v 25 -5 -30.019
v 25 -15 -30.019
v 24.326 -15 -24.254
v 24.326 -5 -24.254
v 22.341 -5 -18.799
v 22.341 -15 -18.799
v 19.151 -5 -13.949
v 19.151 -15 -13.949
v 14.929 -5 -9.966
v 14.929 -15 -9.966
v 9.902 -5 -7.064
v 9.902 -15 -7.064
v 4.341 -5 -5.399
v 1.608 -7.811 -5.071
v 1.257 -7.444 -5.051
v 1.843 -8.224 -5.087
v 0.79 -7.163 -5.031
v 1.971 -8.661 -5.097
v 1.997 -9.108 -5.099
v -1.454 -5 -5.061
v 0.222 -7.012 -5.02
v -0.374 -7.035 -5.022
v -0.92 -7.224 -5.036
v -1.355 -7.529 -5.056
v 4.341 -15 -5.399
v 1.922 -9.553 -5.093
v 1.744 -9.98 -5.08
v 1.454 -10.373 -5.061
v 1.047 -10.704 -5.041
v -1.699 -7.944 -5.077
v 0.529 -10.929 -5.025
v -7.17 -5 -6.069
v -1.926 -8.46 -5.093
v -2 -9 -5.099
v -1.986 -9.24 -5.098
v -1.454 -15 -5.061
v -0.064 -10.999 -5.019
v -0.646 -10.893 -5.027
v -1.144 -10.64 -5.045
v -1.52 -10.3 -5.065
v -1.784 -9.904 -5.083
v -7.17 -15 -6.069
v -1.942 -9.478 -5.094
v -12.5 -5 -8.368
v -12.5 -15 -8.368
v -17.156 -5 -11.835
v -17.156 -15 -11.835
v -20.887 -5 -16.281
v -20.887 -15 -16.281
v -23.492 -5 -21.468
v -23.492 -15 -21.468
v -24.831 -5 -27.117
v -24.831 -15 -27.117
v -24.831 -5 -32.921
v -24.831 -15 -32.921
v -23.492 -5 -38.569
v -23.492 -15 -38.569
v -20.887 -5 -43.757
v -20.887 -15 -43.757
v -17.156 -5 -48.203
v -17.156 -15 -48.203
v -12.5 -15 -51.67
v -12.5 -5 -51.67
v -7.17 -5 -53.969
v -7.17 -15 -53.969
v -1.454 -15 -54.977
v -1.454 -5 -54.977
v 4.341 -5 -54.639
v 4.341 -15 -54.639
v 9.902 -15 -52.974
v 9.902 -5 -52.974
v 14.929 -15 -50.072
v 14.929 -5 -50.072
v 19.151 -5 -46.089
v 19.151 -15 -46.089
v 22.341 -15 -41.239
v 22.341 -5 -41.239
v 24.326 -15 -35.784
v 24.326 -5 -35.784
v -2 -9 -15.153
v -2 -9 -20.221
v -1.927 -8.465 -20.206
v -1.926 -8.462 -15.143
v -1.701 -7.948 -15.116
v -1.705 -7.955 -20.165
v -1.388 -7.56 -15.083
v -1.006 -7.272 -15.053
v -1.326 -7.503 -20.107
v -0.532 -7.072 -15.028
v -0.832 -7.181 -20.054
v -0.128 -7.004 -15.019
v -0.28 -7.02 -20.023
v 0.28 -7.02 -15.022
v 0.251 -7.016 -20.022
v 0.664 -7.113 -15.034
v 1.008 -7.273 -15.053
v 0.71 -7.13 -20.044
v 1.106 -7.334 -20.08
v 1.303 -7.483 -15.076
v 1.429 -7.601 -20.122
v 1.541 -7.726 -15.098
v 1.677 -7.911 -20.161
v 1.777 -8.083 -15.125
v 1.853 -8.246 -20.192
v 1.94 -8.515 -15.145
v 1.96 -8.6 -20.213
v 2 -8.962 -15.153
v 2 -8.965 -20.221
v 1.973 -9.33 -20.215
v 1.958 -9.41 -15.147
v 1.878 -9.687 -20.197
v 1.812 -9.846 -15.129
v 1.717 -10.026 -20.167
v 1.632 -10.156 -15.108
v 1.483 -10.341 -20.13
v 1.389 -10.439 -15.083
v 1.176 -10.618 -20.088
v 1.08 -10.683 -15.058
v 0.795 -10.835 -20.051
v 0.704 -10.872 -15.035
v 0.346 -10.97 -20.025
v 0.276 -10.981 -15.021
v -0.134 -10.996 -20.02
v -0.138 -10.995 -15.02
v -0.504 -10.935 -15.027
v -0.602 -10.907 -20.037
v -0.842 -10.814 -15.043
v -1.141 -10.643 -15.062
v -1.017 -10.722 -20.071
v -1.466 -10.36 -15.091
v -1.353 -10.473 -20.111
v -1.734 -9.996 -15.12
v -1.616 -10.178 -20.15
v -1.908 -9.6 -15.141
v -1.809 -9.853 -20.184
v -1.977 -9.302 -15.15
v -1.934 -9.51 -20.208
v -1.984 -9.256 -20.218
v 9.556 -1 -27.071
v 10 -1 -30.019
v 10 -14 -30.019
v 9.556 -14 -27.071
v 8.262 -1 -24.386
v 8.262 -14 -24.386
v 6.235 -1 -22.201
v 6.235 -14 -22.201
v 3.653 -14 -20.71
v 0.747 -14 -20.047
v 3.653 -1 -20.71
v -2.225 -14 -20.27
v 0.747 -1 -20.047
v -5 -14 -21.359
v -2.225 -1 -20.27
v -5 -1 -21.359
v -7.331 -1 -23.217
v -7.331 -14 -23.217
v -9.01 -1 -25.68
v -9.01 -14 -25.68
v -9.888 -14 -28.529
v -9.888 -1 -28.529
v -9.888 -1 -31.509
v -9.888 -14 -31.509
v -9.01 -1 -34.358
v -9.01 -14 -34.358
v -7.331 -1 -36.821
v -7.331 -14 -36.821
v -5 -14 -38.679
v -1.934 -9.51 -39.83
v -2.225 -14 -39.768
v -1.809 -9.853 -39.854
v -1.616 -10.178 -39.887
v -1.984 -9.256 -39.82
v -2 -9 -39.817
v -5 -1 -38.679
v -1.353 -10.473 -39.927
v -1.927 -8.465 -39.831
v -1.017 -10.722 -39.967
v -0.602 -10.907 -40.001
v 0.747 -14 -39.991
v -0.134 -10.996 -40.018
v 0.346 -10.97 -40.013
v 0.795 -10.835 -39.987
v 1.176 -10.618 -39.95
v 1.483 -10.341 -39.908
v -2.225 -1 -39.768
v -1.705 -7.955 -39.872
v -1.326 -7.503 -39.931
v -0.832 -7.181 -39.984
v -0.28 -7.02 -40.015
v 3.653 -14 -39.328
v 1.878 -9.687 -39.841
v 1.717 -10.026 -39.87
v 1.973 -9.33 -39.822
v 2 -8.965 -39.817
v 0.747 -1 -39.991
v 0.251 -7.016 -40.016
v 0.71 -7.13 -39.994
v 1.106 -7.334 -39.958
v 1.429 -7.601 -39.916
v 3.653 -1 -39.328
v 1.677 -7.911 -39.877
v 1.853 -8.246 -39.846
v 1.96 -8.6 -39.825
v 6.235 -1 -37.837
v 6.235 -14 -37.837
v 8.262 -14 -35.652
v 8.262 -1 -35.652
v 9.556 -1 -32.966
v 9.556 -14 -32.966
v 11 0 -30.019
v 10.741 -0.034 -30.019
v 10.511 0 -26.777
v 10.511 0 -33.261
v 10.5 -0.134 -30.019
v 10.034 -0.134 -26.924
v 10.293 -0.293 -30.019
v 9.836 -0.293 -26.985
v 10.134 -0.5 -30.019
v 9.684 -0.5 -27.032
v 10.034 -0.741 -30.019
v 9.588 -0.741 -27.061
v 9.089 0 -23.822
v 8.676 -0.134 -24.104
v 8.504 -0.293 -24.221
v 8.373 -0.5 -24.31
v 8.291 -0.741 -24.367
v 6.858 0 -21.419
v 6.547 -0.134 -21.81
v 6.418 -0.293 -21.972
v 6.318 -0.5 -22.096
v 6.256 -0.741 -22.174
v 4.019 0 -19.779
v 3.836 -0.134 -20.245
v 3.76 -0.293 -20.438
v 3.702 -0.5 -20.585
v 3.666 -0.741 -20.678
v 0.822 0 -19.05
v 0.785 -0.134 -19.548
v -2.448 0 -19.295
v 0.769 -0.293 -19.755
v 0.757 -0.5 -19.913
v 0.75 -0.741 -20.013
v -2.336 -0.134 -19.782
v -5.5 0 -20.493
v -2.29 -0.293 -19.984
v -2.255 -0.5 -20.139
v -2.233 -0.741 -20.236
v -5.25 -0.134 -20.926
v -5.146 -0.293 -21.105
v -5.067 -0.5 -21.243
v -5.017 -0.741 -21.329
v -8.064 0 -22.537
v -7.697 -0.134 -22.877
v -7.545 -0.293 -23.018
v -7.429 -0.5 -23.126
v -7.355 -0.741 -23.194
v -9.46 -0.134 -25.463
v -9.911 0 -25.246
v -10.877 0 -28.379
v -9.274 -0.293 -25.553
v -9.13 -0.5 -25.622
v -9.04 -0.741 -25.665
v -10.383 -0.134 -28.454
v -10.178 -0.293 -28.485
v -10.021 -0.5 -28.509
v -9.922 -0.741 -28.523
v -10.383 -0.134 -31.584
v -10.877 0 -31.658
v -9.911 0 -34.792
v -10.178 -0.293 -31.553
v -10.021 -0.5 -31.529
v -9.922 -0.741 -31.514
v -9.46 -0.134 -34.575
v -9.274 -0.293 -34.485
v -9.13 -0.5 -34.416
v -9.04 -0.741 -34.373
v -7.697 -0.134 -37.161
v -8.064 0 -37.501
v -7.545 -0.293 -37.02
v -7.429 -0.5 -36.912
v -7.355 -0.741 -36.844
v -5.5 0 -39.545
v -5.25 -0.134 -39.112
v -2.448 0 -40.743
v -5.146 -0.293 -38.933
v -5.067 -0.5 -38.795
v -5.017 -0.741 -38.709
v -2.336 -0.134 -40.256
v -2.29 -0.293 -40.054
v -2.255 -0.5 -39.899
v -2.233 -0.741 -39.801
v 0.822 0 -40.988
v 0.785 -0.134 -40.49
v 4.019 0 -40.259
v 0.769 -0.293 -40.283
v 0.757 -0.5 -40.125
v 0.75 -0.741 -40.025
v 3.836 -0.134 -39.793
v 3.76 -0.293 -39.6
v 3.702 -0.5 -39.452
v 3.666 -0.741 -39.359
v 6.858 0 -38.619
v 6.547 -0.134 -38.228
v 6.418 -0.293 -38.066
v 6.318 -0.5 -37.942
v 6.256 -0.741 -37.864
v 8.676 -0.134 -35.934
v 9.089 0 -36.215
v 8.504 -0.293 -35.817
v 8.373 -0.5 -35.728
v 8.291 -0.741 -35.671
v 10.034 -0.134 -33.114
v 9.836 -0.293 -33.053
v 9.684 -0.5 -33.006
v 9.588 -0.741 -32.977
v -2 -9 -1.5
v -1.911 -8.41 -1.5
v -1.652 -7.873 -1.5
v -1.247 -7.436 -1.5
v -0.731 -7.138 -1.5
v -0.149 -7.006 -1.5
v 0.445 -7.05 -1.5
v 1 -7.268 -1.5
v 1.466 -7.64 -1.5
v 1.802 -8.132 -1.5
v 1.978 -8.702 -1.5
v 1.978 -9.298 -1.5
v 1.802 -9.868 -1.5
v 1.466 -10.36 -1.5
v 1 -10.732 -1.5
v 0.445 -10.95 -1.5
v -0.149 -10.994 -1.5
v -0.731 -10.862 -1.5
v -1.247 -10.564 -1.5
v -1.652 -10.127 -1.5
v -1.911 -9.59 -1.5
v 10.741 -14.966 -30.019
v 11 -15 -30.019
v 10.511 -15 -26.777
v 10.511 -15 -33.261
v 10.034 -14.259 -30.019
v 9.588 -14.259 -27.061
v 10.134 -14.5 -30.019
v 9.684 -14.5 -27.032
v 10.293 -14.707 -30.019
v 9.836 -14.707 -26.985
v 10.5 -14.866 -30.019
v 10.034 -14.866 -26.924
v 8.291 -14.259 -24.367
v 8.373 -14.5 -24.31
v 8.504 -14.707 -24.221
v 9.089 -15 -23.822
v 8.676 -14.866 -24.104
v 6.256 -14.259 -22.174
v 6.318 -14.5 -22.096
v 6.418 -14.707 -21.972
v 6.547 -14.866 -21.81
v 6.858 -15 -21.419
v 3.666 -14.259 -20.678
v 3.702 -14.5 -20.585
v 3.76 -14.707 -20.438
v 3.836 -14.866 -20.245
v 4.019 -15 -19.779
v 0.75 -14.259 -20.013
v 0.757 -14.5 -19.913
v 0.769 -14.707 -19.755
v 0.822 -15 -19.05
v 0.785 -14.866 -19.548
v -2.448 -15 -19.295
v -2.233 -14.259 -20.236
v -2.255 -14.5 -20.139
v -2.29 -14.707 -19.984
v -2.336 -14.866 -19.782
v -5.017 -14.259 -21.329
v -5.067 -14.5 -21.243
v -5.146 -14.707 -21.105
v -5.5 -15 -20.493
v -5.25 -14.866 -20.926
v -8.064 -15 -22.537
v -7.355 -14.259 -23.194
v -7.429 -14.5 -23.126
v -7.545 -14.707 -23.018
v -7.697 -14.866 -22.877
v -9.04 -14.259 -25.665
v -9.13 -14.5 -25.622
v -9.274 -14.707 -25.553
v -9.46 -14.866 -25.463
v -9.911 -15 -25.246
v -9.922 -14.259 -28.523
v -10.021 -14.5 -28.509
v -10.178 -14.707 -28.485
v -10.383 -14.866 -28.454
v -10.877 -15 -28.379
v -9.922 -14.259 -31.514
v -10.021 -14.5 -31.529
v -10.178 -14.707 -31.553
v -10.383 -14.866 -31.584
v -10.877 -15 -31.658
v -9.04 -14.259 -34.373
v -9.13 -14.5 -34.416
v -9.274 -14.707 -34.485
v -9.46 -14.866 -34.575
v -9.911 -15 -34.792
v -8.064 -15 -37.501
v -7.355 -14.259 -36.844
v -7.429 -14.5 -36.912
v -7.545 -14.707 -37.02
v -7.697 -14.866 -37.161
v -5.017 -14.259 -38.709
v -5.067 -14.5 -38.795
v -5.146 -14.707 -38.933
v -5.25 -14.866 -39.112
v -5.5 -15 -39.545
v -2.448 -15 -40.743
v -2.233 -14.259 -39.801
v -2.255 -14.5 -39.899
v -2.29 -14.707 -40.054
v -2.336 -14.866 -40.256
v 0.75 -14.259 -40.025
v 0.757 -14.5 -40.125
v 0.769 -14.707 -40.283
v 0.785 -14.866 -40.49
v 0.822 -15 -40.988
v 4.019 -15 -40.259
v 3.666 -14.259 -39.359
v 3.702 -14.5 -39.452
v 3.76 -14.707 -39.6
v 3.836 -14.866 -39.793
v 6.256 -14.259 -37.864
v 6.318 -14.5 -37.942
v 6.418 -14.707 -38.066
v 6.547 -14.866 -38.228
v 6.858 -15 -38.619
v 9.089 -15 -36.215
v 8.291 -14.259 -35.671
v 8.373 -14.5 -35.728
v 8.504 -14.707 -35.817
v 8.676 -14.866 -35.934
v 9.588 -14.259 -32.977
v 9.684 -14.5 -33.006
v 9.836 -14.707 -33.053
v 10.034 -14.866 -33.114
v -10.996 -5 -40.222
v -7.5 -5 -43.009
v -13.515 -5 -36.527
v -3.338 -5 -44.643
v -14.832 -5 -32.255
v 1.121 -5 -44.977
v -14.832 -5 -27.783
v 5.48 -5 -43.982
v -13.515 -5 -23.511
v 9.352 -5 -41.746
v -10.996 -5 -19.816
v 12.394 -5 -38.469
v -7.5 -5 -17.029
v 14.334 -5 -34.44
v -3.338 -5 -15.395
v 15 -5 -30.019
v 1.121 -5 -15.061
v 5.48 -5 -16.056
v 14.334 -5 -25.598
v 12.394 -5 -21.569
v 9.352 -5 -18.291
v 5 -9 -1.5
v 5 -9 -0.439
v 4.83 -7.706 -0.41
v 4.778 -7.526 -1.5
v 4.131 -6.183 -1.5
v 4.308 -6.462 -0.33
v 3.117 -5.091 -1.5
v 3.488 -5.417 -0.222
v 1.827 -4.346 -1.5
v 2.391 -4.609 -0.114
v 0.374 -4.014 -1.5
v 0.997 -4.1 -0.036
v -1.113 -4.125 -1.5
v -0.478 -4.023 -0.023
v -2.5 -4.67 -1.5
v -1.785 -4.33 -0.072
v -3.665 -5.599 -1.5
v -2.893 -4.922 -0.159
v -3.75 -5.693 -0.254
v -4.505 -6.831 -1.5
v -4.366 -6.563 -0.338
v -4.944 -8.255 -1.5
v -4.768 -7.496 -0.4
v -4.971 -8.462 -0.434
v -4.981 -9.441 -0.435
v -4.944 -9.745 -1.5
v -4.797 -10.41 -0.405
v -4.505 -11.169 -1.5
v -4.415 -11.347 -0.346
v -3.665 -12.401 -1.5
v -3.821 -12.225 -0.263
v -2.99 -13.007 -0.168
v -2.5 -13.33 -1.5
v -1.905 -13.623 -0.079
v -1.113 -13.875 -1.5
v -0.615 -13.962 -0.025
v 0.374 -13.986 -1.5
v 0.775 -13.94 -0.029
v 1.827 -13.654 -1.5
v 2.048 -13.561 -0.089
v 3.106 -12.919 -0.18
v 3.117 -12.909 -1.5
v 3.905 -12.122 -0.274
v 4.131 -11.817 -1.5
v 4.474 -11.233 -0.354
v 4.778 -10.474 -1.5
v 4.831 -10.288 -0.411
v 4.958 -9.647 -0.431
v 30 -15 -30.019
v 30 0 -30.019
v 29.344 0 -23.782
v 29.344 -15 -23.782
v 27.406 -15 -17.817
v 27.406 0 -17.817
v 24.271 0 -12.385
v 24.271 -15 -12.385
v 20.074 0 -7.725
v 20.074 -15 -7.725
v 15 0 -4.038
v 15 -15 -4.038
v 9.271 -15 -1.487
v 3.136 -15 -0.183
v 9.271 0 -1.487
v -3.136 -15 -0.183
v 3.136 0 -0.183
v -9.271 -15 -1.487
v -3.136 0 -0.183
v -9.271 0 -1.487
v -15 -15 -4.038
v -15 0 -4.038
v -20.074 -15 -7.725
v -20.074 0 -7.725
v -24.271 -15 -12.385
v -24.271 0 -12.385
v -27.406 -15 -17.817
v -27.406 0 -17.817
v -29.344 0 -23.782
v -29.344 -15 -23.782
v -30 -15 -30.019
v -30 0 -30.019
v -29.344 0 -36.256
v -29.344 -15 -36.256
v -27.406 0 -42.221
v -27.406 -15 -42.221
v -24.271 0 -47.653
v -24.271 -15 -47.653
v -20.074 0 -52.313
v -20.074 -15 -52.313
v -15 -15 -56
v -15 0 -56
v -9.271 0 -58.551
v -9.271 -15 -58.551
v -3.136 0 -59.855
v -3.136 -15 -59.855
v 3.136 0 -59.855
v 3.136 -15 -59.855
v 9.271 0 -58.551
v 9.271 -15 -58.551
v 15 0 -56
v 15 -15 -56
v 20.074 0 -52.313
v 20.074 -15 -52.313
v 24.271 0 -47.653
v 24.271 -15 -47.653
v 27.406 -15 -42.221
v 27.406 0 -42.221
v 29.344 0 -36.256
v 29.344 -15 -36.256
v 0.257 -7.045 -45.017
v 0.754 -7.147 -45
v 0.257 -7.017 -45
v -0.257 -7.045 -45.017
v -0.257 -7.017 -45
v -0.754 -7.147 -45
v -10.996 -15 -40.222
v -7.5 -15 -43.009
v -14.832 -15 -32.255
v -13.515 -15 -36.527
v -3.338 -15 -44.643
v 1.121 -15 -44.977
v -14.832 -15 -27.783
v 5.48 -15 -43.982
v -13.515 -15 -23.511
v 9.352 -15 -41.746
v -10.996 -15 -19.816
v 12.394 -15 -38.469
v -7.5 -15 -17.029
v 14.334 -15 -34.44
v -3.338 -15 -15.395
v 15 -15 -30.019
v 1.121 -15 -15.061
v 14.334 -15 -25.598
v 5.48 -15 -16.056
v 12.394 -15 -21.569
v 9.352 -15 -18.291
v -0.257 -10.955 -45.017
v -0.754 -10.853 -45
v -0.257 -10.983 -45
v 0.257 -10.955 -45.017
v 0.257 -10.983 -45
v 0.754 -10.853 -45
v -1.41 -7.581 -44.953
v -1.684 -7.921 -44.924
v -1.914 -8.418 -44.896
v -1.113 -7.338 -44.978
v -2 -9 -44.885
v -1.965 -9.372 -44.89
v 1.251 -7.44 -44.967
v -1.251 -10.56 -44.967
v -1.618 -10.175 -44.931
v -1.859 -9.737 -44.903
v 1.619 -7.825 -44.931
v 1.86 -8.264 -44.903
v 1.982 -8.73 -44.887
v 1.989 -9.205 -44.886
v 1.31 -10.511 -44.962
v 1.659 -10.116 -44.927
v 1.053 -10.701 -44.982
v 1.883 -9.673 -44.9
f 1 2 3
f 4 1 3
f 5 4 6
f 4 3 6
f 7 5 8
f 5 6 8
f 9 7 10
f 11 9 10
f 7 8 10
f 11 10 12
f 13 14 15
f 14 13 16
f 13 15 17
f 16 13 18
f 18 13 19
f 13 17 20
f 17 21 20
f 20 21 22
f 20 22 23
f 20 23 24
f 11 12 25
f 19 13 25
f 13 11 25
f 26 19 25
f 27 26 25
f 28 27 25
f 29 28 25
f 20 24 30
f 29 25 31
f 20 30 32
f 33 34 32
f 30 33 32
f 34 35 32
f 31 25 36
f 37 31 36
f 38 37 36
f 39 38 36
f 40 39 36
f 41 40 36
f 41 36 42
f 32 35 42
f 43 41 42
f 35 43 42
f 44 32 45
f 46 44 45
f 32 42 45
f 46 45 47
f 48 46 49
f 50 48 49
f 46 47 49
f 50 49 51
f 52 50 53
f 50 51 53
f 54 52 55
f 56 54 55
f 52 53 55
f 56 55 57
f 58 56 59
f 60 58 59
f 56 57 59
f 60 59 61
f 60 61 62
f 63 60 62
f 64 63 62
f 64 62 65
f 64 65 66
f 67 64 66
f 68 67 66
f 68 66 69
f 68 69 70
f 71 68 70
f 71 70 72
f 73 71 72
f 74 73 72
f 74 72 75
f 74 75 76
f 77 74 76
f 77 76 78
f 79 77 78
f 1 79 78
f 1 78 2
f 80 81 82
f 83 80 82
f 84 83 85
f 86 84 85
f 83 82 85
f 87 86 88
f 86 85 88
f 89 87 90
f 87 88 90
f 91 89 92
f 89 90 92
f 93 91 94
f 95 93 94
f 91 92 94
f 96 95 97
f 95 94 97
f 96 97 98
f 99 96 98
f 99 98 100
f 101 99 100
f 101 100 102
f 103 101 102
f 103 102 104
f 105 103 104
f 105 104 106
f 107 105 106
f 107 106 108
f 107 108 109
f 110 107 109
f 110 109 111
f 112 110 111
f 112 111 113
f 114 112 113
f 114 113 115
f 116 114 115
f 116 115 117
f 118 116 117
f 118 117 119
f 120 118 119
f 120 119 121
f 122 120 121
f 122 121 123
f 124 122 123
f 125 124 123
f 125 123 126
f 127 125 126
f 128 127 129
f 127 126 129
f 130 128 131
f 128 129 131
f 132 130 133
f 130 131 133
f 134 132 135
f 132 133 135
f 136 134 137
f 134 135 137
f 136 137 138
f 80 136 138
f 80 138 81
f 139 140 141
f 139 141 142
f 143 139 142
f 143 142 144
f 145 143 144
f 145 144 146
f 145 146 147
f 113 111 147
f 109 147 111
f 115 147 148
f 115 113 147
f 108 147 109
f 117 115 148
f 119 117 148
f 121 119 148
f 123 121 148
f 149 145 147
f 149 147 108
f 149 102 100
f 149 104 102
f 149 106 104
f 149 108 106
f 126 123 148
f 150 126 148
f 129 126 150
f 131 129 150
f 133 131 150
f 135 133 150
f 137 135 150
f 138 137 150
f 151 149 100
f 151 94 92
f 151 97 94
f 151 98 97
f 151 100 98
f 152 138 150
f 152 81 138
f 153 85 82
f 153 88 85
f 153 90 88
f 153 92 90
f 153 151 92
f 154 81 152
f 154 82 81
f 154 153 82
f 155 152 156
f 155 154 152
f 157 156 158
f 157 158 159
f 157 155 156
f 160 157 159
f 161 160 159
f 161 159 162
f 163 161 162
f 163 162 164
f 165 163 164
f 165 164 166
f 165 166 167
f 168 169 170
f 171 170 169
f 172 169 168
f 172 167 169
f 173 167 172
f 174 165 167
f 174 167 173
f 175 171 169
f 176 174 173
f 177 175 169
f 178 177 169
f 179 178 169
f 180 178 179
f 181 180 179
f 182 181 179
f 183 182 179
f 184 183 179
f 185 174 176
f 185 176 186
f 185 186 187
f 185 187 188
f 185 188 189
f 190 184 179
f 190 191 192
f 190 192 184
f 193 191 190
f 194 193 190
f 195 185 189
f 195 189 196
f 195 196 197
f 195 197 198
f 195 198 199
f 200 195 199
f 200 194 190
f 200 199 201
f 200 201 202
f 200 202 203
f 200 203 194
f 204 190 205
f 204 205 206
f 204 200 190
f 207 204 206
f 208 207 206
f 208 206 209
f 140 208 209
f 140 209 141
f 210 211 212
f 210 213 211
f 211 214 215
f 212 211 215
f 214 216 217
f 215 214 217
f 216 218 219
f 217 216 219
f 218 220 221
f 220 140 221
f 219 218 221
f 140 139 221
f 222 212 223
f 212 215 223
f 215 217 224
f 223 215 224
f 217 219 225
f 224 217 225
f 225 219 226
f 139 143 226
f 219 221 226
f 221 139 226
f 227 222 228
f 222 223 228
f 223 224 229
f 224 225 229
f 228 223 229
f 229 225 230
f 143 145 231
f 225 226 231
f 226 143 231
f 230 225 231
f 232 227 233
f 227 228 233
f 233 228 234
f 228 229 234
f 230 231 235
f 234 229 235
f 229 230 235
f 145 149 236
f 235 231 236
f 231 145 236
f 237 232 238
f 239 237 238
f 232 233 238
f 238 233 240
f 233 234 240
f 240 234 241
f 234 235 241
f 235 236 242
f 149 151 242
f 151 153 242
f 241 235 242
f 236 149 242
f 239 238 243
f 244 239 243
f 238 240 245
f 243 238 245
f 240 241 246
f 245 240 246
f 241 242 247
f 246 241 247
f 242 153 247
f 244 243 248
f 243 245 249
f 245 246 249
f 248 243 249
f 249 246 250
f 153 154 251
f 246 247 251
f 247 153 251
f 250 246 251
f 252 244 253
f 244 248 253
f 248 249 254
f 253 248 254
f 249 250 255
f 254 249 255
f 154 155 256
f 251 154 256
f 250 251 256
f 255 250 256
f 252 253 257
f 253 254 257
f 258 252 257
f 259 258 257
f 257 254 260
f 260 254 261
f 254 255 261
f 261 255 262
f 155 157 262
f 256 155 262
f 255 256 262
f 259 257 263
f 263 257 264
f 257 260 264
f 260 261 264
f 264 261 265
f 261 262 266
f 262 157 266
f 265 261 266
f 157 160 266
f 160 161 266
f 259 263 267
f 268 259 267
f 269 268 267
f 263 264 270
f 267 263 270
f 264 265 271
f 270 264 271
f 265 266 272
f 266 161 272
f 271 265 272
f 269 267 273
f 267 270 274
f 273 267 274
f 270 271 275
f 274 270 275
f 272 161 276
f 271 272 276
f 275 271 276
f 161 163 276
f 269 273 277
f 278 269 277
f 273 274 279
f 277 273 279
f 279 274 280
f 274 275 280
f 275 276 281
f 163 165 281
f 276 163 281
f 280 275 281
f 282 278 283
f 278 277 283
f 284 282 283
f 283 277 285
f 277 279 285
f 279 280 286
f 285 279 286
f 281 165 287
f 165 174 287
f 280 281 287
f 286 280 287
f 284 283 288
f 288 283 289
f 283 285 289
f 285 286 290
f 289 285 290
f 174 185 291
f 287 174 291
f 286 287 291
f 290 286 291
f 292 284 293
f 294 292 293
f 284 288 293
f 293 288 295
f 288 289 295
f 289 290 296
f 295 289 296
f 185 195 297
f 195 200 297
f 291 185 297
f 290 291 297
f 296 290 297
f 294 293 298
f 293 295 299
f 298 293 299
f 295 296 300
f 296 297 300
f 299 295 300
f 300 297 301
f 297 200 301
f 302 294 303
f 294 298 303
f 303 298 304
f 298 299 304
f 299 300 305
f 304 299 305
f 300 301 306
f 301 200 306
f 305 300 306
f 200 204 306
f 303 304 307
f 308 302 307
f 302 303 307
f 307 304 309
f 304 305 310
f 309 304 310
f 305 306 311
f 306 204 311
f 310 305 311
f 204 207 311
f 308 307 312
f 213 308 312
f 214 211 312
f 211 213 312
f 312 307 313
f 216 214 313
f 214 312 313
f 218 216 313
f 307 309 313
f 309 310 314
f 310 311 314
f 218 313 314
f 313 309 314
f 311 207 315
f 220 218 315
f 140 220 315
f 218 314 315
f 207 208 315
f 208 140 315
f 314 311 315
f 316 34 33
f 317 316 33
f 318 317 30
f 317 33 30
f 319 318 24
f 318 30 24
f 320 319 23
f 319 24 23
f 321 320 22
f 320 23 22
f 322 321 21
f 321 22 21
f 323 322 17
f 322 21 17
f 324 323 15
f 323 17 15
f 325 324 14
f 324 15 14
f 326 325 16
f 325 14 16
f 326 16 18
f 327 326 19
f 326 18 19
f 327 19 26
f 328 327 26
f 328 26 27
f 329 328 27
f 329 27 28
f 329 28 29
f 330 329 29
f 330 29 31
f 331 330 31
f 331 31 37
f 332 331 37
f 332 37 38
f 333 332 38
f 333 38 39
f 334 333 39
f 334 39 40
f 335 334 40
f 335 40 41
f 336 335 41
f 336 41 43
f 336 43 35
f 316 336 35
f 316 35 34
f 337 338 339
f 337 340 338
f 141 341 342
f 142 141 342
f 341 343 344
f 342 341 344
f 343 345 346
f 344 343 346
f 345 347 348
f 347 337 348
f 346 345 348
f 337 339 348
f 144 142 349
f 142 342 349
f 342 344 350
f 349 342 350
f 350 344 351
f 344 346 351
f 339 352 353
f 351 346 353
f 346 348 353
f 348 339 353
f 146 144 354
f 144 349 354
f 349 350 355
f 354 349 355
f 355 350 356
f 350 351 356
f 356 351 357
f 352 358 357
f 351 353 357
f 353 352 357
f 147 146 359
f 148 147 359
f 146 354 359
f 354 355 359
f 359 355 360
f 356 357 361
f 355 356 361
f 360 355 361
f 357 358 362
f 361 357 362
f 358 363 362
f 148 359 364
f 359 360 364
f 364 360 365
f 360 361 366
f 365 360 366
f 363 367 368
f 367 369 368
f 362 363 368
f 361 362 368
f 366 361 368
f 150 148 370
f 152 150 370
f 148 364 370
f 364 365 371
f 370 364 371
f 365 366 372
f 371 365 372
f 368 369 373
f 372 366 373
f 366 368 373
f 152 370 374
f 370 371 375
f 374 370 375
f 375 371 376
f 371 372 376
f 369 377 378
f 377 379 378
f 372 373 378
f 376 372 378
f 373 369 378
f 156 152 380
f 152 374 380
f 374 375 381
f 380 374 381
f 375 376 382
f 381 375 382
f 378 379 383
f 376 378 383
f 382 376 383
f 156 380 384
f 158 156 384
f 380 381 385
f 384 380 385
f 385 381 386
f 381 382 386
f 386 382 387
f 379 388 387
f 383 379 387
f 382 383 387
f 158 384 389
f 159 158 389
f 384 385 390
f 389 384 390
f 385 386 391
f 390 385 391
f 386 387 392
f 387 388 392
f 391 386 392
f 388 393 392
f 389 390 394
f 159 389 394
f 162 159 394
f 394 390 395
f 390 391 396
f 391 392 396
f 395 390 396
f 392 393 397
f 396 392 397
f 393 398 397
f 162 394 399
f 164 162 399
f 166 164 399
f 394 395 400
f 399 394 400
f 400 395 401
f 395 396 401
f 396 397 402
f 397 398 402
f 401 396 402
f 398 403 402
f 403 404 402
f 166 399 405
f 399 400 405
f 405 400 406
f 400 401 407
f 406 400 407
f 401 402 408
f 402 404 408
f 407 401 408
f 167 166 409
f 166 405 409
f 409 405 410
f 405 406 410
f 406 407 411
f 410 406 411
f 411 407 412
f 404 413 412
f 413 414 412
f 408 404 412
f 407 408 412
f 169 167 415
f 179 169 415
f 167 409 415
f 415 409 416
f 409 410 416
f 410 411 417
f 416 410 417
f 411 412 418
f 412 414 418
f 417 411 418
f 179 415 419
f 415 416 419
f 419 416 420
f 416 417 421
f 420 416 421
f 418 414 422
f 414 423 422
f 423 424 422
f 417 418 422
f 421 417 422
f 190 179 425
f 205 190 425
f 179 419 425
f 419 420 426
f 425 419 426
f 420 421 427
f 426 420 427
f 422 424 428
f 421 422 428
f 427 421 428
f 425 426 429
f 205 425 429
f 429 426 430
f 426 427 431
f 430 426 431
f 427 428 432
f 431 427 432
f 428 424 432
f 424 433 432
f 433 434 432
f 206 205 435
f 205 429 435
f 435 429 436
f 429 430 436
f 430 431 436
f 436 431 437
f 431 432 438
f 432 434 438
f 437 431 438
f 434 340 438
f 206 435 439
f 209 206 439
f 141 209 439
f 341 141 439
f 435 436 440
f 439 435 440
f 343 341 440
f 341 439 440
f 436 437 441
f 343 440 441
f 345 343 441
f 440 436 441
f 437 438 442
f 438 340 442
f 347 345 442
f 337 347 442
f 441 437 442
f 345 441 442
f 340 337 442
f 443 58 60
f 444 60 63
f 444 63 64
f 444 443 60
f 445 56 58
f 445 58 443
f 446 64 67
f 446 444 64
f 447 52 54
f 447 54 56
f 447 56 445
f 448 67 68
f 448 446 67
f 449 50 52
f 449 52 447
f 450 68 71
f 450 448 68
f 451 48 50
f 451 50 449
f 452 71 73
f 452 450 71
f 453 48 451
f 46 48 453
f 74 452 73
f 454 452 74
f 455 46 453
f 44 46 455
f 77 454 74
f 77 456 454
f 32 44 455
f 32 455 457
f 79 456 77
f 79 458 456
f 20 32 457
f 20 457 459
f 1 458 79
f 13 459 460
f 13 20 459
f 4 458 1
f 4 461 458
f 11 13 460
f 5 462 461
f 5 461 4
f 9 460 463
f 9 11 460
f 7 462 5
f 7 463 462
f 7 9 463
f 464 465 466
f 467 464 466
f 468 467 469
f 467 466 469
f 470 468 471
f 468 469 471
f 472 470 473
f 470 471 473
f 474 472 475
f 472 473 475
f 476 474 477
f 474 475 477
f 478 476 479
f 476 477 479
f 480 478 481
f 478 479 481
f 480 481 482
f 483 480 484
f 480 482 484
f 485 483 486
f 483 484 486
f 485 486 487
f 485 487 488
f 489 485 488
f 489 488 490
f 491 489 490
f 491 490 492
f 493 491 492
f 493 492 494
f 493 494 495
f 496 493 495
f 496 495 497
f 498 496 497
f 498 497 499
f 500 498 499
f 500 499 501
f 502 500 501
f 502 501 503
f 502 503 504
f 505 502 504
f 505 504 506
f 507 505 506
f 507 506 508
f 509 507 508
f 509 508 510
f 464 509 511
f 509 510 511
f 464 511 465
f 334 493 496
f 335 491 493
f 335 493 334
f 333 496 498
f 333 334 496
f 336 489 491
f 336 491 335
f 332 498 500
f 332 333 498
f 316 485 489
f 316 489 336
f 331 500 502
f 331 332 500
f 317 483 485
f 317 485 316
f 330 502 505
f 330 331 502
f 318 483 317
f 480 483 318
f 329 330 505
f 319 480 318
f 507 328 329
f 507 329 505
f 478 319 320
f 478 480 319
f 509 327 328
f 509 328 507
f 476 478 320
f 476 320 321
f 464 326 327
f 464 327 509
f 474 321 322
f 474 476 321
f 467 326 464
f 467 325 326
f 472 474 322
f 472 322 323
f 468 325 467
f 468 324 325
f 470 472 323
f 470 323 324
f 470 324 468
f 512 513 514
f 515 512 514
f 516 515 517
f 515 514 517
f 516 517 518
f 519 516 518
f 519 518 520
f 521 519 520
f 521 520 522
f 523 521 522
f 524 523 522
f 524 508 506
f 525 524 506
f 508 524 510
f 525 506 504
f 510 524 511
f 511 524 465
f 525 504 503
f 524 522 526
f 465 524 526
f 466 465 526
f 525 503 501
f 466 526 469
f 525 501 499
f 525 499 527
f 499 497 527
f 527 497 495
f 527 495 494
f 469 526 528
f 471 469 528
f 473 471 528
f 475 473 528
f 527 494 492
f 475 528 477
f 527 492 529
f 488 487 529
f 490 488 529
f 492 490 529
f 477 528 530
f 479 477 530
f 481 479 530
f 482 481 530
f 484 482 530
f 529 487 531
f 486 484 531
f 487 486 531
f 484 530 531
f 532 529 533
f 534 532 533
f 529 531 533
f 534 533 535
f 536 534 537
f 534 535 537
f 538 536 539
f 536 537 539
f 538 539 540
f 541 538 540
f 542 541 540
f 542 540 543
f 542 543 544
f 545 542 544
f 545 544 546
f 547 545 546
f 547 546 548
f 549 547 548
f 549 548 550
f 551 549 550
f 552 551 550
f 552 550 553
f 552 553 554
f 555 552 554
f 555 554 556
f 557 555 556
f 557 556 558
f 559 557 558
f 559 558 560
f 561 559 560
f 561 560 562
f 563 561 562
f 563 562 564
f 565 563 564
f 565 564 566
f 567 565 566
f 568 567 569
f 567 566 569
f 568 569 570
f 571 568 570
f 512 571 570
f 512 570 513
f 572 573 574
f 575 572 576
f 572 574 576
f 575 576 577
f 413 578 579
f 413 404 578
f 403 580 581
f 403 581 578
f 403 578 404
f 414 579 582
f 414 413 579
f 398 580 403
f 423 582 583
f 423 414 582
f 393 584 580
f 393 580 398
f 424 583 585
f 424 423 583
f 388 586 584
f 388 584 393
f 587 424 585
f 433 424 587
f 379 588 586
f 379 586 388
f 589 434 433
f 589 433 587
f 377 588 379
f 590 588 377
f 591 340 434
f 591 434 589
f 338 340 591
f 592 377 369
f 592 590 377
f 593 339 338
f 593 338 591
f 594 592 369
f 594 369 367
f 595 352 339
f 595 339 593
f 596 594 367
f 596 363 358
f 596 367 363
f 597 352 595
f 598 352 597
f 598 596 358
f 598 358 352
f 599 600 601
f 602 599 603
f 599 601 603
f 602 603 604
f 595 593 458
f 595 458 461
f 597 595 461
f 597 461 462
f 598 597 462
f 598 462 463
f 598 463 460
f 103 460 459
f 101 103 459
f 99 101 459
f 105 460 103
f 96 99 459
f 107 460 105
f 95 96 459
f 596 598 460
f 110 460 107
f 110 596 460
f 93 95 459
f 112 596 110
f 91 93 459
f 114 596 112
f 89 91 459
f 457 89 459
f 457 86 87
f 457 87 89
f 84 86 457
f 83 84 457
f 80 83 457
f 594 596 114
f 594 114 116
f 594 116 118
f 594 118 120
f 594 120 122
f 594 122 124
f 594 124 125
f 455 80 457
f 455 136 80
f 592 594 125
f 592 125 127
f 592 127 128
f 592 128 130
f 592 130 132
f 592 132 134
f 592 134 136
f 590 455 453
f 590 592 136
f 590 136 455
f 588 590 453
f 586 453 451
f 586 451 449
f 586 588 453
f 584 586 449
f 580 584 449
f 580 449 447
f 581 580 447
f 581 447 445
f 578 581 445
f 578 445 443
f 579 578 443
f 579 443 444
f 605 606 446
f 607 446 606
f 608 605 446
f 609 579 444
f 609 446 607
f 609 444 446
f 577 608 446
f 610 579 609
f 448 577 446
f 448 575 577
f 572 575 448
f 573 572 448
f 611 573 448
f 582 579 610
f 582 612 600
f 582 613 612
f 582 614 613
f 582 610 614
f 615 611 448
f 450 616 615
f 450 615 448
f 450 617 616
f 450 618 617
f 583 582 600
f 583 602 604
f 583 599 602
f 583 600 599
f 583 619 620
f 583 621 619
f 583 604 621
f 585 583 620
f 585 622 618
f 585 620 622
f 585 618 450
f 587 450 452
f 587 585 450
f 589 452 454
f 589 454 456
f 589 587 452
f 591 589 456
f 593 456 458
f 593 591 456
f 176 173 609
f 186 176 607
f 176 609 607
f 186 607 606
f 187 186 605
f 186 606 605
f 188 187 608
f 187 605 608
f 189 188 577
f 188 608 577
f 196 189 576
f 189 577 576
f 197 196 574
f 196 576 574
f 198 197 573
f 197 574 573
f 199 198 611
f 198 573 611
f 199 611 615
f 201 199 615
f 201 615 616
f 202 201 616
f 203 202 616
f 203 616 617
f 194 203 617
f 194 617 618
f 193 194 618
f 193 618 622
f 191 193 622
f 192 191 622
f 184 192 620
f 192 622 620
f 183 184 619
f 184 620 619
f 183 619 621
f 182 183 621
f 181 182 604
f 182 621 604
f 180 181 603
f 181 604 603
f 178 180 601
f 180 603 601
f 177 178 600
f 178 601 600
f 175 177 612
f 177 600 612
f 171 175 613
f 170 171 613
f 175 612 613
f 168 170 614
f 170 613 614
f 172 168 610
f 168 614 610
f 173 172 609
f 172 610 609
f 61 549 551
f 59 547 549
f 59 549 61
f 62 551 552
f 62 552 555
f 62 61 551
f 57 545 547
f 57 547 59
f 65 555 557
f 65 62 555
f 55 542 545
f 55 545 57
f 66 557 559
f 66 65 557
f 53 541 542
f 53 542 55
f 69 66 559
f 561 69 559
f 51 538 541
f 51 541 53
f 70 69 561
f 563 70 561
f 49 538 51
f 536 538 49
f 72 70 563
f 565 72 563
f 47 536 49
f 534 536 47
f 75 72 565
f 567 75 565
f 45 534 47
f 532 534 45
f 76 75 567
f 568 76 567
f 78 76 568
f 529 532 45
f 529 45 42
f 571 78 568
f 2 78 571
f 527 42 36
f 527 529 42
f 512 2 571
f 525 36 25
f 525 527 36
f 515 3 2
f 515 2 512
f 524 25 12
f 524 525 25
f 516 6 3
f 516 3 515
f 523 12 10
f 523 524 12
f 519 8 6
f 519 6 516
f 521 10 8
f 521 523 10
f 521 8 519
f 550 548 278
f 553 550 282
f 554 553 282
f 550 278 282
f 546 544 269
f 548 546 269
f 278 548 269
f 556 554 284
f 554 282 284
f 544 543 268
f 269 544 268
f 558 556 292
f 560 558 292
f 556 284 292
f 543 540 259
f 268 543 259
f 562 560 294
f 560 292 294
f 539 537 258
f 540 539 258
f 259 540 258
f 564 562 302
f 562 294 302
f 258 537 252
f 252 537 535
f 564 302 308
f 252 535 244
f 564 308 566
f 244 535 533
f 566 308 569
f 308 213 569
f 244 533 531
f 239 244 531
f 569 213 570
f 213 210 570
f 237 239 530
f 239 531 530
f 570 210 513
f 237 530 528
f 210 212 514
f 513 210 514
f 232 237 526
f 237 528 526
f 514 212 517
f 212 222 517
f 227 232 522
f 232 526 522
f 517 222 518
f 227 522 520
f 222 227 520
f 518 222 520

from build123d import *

# Parameters (mm, degrees)
F0_R     = 30
F0_R_2   = 10
F1_DEPTH = 15
F2_R     = 5
F3_DEPTH = 1.5
F4_R     = 25
F4_R_2   = 15
F5_DEPTH = 10
F7_D     = 4
F7_DEPTH = 45
F7_TIP   = 1.2017212381
F8_R     = 1


with BuildPart() as f1:
    # F0 (on Front) → F1 (new body)
    with BuildSketch(Plane.XZ):
        with Locations((0, -30.0189442933)):
            Circle(F0_R)
        with Locations((0, -30.0189442933)):
            Circle(F0_R_2, mode=Mode.SUBTRACT)
    extrude(amount=F1_DEPTH)

    # F2 (on Top) → F3 (cut)
    with BuildSketch(Plane.XY):
        with Locations((0, -9)):
            Circle(F2_R)
    extrude(amount=-F3_DEPTH, mode=Mode.SUBTRACT)

    # F4 (on face) → F5 (cut)
    with BuildSketch(Plane.XZ.offset(15)):
        with Locations((0, -30.0189442933)):
            Circle(F4_R)
        with Locations((0, -30.0189442933)):
            Circle(F4_R_2, mode=Mode.SUBTRACT)
    extrude(amount=-F5_DEPTH, mode=Mode.SUBTRACT)

    # F7
    with Locations(Plane.XY):
        with Locations((0, -9)):
            Hole(F7_D / 2, depth=F7_DEPTH)
            with Locations((0, 0, -(F7_DEPTH + F7_TIP / 2))):  # 118° drill point
                Cone(0, F7_D / 2, F7_TIP, mode=Mode.SUBTRACT)

    # F8
    f8_edges = [f1.edges().sort_by_distance(p)[0] for p in [
        (-10, 0, -30.018944),
        (-10, -15, -30.018944),
    ]]
    fillet(f8_edges, radius=F8_R)


solid = f1.part
